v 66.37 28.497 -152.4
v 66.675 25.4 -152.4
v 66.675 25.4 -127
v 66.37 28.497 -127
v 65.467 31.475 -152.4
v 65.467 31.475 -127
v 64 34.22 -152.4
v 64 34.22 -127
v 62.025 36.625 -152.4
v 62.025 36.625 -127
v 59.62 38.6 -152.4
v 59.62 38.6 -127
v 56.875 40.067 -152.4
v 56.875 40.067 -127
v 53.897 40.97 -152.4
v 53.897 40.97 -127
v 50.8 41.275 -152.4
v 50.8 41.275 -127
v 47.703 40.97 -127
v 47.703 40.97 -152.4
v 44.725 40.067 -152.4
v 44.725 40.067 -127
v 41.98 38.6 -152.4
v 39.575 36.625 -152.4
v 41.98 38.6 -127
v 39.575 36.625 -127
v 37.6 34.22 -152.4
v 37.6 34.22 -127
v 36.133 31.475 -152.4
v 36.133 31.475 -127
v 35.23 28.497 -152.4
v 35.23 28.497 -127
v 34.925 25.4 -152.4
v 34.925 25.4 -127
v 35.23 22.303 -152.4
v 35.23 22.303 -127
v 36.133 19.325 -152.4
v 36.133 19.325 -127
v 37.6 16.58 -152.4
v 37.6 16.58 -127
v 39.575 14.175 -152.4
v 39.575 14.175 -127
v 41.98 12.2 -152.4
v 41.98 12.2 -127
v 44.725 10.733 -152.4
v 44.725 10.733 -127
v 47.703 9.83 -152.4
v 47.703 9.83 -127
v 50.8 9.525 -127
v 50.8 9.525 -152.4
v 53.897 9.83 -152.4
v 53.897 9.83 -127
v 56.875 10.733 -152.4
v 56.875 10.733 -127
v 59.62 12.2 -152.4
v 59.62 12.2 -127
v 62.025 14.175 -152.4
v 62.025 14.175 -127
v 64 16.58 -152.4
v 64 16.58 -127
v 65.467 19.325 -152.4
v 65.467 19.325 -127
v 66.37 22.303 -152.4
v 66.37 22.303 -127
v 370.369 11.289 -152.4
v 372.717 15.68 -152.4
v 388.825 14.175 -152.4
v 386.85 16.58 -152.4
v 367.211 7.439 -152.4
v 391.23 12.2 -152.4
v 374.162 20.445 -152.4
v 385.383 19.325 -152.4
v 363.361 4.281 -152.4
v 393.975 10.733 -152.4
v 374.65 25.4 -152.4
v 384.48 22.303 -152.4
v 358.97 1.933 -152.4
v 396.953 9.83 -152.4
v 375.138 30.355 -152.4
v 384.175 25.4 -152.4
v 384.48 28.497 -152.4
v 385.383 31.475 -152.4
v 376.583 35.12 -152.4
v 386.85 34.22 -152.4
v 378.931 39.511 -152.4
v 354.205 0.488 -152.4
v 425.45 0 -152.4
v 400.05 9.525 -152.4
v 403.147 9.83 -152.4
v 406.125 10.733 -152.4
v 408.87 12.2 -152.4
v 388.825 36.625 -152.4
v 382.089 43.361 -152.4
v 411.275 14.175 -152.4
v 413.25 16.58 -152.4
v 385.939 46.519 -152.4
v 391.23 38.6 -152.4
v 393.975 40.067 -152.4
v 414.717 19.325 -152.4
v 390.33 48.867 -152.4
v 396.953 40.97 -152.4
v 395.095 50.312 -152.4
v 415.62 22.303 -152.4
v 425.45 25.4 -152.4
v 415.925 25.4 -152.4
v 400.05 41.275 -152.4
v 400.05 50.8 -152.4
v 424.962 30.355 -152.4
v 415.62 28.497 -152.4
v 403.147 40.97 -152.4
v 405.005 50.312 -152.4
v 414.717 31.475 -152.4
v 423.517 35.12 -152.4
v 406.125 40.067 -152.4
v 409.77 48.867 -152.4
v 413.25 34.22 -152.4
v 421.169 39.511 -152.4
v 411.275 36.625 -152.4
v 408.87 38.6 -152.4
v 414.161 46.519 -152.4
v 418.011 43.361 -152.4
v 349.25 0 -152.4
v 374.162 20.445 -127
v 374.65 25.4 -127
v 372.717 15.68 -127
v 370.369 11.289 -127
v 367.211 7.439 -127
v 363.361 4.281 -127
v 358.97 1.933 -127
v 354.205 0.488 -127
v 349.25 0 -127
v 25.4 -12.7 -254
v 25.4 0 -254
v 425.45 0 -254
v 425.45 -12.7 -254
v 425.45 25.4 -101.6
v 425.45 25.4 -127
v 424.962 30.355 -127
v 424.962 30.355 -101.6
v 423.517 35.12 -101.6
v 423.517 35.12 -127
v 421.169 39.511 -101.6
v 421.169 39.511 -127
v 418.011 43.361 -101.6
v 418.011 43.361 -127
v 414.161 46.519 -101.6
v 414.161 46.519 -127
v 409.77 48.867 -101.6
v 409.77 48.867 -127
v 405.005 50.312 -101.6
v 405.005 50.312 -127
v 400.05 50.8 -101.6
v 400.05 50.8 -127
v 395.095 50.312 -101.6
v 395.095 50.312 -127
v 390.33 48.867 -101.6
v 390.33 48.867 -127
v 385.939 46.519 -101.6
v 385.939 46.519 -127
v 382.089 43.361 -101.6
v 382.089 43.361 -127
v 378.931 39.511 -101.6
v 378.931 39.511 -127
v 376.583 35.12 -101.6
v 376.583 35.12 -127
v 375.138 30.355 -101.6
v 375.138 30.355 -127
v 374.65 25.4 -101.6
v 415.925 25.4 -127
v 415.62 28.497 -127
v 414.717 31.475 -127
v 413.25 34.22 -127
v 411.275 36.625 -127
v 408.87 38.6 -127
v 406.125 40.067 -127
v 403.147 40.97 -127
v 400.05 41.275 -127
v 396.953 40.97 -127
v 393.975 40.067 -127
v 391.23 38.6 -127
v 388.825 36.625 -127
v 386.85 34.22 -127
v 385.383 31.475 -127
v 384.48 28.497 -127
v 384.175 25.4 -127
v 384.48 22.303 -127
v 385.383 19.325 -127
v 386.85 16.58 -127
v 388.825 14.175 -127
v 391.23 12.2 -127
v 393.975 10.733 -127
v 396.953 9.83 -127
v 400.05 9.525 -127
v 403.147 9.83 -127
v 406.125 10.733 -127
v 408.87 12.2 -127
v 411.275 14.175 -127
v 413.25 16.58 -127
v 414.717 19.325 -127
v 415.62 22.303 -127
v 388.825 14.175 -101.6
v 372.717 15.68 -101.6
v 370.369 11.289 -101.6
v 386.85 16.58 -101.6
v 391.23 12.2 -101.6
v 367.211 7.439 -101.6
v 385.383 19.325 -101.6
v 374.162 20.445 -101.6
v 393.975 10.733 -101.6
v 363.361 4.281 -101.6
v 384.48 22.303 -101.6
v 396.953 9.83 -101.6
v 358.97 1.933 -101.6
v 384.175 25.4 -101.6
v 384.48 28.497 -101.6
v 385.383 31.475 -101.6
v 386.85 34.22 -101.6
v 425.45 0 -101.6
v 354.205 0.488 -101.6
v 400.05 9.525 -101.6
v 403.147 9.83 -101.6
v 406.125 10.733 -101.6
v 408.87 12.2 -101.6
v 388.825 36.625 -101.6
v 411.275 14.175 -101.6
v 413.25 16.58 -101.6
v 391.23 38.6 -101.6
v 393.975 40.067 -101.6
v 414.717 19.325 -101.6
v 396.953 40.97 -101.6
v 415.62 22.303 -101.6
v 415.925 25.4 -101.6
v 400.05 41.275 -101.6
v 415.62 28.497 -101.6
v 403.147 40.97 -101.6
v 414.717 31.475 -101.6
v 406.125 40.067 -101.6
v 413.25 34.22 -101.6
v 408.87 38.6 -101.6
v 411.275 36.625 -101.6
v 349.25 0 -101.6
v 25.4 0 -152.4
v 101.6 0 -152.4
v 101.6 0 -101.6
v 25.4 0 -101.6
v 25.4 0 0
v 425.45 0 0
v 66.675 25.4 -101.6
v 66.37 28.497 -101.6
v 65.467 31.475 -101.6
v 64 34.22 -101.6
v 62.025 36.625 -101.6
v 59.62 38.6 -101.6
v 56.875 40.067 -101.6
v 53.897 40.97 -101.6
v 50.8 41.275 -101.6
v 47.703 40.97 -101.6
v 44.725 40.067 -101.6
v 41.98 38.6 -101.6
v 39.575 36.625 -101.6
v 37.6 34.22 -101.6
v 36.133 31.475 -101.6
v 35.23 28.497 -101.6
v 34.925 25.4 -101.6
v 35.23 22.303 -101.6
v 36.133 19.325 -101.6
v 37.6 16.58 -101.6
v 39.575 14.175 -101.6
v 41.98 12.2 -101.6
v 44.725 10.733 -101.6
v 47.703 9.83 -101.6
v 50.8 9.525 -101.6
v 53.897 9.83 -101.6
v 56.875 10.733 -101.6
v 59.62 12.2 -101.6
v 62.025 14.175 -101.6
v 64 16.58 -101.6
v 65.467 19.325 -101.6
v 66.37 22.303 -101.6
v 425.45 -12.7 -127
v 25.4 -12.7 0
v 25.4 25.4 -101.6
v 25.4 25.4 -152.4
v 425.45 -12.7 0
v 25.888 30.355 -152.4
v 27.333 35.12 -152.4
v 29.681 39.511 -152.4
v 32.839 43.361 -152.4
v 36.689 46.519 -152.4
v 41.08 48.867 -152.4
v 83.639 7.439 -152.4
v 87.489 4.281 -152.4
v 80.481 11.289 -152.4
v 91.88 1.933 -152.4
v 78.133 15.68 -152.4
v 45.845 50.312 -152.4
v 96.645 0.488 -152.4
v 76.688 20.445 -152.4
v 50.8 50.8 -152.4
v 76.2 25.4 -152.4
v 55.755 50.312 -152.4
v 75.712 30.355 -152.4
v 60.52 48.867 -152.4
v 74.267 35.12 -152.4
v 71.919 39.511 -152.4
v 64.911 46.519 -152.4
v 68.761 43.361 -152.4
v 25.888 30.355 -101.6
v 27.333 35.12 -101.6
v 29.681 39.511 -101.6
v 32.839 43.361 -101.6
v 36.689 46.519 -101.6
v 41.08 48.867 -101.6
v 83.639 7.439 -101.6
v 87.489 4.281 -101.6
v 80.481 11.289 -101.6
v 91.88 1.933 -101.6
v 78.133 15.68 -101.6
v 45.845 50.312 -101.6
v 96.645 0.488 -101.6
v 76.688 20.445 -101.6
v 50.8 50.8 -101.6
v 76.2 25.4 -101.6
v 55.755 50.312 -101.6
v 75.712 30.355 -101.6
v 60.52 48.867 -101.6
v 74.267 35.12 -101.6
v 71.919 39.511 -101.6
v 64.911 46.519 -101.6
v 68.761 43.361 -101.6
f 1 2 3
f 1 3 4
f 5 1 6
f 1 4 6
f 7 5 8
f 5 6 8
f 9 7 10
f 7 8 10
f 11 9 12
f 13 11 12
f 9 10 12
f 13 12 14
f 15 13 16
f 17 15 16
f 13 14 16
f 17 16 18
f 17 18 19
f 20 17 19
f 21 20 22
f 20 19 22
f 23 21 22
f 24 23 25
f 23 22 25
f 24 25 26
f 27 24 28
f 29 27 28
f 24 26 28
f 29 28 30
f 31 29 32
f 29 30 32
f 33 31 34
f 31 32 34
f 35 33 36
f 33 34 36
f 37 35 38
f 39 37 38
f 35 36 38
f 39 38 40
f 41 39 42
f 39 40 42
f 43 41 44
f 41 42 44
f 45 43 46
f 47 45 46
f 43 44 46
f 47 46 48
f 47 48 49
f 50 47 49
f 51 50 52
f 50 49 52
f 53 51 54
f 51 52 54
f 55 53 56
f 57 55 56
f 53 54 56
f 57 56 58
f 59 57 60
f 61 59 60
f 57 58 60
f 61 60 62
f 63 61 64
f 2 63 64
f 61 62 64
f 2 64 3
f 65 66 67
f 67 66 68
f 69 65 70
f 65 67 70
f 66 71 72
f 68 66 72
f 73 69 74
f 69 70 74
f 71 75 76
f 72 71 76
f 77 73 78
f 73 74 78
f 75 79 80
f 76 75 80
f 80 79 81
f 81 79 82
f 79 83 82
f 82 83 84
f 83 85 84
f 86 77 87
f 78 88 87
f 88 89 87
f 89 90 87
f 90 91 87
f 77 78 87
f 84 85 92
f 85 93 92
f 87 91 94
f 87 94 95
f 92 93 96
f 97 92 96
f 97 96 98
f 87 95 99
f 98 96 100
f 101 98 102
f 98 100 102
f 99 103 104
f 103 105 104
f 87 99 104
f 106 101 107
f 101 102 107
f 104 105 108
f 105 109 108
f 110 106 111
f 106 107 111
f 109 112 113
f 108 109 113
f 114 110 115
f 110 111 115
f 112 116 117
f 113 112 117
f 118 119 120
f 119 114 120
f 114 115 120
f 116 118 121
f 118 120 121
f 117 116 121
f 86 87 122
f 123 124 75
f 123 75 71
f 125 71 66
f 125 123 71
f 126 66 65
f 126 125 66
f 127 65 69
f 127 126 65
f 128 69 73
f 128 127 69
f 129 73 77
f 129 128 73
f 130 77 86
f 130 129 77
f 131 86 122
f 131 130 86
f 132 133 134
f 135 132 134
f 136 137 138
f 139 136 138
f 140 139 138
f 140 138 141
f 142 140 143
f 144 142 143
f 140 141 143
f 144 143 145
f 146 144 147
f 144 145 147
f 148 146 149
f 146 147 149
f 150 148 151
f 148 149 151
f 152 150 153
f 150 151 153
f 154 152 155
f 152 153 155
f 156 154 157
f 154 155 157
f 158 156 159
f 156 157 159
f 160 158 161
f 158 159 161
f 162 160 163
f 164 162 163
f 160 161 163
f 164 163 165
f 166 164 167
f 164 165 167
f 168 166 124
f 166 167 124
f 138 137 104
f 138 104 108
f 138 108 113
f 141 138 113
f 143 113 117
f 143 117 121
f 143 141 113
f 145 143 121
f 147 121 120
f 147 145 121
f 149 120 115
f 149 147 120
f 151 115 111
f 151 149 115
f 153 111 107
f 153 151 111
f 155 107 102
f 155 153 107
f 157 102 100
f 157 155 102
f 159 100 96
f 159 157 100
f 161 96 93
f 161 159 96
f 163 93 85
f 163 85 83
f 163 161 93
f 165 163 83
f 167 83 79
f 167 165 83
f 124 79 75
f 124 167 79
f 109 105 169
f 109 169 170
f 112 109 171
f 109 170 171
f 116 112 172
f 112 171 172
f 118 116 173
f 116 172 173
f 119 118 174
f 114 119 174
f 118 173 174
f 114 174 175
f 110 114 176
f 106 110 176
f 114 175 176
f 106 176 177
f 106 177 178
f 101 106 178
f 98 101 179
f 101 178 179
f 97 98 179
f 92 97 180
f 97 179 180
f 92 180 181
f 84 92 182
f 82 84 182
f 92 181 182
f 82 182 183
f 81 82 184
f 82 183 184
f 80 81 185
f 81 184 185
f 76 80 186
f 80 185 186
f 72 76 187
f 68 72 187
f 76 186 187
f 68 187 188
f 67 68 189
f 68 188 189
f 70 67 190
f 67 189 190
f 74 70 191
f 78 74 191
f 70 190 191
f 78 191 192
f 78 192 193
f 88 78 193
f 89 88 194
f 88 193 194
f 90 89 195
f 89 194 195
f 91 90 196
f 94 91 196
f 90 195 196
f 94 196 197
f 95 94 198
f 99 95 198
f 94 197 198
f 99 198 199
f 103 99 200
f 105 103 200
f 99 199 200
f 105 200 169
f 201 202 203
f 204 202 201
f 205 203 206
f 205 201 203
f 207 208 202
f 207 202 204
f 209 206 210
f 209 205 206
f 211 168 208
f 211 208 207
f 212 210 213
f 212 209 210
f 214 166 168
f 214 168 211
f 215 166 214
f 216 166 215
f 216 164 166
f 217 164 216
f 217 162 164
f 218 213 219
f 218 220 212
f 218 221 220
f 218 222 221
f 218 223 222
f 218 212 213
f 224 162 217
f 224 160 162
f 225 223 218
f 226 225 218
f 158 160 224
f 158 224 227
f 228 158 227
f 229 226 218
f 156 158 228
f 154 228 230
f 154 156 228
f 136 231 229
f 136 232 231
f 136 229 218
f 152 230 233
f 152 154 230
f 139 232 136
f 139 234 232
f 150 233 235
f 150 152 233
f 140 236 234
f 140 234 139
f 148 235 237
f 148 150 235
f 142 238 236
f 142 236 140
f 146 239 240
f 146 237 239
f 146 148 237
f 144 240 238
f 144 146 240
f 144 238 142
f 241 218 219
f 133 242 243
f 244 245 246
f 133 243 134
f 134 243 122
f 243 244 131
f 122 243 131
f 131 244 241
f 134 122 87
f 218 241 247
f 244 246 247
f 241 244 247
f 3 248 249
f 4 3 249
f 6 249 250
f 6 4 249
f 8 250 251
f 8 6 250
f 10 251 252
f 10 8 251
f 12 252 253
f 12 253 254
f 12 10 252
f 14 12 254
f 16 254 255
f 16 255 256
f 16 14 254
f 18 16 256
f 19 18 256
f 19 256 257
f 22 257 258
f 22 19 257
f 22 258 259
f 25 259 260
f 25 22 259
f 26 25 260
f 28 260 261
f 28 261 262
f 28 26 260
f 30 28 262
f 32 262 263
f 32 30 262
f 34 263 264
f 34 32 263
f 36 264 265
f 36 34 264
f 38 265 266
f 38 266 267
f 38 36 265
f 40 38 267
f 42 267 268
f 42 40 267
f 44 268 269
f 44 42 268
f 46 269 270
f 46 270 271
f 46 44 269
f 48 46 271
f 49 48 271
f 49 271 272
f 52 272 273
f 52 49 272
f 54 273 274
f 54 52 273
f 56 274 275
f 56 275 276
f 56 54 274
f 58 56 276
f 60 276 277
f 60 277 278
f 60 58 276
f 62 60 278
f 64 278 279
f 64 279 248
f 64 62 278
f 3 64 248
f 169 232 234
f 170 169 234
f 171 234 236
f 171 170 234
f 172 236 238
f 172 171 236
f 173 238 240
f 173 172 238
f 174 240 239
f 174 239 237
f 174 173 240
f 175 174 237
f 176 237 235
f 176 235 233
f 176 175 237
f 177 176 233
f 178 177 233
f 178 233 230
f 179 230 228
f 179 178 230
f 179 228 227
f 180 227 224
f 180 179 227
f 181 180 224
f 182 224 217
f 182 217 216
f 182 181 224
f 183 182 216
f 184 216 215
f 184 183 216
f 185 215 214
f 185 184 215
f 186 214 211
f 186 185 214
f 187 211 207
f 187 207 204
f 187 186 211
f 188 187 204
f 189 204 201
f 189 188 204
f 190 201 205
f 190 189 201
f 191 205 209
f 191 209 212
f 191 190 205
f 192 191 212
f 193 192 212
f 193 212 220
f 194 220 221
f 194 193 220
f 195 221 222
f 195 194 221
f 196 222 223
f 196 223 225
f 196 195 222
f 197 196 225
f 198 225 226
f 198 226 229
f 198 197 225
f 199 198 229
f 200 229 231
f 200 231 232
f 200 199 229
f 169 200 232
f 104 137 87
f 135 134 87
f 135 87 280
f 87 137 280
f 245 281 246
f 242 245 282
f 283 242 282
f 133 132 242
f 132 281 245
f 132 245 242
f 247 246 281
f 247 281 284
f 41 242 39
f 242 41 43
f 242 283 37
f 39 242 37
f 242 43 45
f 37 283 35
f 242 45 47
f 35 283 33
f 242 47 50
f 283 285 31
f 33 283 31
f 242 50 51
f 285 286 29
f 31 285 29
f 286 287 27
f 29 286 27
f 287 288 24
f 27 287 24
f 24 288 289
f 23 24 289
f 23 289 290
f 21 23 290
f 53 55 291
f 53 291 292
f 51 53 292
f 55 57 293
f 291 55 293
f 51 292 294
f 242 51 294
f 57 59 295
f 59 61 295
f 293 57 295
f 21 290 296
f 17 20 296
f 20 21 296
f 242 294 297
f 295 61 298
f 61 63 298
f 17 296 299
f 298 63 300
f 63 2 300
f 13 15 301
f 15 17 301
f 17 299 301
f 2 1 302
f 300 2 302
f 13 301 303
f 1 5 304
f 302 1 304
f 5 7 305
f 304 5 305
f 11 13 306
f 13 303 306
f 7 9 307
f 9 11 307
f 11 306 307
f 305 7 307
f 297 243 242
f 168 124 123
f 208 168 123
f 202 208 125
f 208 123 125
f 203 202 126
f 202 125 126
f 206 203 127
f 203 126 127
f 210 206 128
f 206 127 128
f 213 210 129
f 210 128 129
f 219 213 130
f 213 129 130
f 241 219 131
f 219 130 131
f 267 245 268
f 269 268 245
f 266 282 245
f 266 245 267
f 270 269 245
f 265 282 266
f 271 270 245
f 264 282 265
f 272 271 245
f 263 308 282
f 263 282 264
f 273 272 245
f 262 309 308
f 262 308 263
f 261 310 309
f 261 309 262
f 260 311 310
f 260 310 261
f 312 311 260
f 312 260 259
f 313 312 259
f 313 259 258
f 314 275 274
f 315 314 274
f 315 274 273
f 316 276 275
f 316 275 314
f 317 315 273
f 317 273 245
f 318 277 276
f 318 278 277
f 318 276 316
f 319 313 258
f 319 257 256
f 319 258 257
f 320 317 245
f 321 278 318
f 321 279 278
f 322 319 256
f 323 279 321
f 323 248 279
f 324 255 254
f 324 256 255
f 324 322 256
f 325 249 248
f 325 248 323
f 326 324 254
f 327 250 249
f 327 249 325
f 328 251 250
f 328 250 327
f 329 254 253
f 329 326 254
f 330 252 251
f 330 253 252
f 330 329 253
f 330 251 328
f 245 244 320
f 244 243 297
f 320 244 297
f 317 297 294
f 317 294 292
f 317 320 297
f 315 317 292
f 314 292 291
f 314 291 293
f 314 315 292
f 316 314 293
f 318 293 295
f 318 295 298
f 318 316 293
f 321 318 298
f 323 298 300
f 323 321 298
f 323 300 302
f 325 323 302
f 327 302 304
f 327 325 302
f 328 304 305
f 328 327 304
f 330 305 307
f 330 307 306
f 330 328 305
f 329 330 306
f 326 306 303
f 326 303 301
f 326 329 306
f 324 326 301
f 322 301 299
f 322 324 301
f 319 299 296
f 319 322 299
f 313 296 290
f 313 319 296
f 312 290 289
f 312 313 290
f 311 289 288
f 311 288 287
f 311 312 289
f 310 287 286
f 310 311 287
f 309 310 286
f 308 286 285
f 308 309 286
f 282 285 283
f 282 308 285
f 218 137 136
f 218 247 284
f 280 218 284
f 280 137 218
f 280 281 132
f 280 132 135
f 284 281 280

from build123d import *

# Parameters (mm, degrees)
F0_W          = 457.2
F0_H          = 254
F1_DEPTH      = 12.7
F3_R          = 15.875
F4_DEPTH      = 25.4
F4_DEPTH_BACK = 25.4
F6_DEPTH      = 127
F6_DEPTH_BACK = 127


with BuildPart() as f1:
    # F0 (on Front) → F1 (new body)
    with BuildSketch(Plane.XZ):
        with Locations((228.6, -127)):
            Rectangle(F0_W, F0_H)
    extrude(amount=F1_DEPTH)

    # F3 (on offset) → F4 (join, two sides)
    with BuildSketch(Plane.XY.offset(-127)) as f4_sk:
        with BuildLine():
            ThreePointArc((25.4, 25.4), (17.9605122421, 7.4394877579), (0, 0))
            Line((0, 0), (25.4, 0))
            Line((25.4, 0), (50.8, 0))
            Line((50.8, 0), (76.2, 0))
            Line((76.2, 0), (101.6, 0))
            ThreePointArc((101.6, 0), (83.6394877579, 7.4394877579), (76.2, 25.4))
            ThreePointArc((76.2, 25.4), (50.8, 50.8), (25.4, 25.4))
        make_face()
        with Locations((50.8, 25.4)):
            Circle(F3_R, mode=Mode.SUBTRACT)
        with BuildLine():
            Line((425.45, 0), (450.85, 0))
            ThreePointArc((450.85, 0), (432.8894877579, 7.4394877579), (425.45, 25.4))
            ThreePointArc((425.45, 25.4), (400.05, 50.8), (374.65, 25.4))
            ThreePointArc((374.65, 25.4), (367.2105122421, 7.4394877579), (349.25, 0))
            Line((349.25, 0), (374.65, 0))
            Line((374.65, 0), (400.05, 0))
            Line((400.05, 0), (425.45, 0))
        make_face()
        with Locations((400.05, 25.4)):
            Circle(F3_R, mode=Mode.SUBTRACT)
    extrude(amount=F4_DEPTH)
    extrude(f4_sk.sketch, amount=-F4_DEPTH_BACK)

    # F5 (on offset) → F6 (cut, two sides)
    with BuildSketch(Plane.XY.offset(-127)) as f6_sk:
        Polygon((25.4, -43.3393605053), (25.4, 0), (25.4, 52.3727163672), (-28.9033520967, 52.3727163672), (-28.9033520967, -43.3393605053), align=None)
        Polygon((425.45, 52.3727163672), (425.45, 0), (425.45, -43.3393605053), (479.7533520967, -43.3393605053), (479.7533520967, 52.3727163672), align=None)
    extrude(amount=-F6_DEPTH, mode=Mode.SUBTRACT)
    extrude(f6_sk.sketch, amount=F6_DEPTH_BACK, mode=Mode.SUBTRACT)


solid = f1.part
